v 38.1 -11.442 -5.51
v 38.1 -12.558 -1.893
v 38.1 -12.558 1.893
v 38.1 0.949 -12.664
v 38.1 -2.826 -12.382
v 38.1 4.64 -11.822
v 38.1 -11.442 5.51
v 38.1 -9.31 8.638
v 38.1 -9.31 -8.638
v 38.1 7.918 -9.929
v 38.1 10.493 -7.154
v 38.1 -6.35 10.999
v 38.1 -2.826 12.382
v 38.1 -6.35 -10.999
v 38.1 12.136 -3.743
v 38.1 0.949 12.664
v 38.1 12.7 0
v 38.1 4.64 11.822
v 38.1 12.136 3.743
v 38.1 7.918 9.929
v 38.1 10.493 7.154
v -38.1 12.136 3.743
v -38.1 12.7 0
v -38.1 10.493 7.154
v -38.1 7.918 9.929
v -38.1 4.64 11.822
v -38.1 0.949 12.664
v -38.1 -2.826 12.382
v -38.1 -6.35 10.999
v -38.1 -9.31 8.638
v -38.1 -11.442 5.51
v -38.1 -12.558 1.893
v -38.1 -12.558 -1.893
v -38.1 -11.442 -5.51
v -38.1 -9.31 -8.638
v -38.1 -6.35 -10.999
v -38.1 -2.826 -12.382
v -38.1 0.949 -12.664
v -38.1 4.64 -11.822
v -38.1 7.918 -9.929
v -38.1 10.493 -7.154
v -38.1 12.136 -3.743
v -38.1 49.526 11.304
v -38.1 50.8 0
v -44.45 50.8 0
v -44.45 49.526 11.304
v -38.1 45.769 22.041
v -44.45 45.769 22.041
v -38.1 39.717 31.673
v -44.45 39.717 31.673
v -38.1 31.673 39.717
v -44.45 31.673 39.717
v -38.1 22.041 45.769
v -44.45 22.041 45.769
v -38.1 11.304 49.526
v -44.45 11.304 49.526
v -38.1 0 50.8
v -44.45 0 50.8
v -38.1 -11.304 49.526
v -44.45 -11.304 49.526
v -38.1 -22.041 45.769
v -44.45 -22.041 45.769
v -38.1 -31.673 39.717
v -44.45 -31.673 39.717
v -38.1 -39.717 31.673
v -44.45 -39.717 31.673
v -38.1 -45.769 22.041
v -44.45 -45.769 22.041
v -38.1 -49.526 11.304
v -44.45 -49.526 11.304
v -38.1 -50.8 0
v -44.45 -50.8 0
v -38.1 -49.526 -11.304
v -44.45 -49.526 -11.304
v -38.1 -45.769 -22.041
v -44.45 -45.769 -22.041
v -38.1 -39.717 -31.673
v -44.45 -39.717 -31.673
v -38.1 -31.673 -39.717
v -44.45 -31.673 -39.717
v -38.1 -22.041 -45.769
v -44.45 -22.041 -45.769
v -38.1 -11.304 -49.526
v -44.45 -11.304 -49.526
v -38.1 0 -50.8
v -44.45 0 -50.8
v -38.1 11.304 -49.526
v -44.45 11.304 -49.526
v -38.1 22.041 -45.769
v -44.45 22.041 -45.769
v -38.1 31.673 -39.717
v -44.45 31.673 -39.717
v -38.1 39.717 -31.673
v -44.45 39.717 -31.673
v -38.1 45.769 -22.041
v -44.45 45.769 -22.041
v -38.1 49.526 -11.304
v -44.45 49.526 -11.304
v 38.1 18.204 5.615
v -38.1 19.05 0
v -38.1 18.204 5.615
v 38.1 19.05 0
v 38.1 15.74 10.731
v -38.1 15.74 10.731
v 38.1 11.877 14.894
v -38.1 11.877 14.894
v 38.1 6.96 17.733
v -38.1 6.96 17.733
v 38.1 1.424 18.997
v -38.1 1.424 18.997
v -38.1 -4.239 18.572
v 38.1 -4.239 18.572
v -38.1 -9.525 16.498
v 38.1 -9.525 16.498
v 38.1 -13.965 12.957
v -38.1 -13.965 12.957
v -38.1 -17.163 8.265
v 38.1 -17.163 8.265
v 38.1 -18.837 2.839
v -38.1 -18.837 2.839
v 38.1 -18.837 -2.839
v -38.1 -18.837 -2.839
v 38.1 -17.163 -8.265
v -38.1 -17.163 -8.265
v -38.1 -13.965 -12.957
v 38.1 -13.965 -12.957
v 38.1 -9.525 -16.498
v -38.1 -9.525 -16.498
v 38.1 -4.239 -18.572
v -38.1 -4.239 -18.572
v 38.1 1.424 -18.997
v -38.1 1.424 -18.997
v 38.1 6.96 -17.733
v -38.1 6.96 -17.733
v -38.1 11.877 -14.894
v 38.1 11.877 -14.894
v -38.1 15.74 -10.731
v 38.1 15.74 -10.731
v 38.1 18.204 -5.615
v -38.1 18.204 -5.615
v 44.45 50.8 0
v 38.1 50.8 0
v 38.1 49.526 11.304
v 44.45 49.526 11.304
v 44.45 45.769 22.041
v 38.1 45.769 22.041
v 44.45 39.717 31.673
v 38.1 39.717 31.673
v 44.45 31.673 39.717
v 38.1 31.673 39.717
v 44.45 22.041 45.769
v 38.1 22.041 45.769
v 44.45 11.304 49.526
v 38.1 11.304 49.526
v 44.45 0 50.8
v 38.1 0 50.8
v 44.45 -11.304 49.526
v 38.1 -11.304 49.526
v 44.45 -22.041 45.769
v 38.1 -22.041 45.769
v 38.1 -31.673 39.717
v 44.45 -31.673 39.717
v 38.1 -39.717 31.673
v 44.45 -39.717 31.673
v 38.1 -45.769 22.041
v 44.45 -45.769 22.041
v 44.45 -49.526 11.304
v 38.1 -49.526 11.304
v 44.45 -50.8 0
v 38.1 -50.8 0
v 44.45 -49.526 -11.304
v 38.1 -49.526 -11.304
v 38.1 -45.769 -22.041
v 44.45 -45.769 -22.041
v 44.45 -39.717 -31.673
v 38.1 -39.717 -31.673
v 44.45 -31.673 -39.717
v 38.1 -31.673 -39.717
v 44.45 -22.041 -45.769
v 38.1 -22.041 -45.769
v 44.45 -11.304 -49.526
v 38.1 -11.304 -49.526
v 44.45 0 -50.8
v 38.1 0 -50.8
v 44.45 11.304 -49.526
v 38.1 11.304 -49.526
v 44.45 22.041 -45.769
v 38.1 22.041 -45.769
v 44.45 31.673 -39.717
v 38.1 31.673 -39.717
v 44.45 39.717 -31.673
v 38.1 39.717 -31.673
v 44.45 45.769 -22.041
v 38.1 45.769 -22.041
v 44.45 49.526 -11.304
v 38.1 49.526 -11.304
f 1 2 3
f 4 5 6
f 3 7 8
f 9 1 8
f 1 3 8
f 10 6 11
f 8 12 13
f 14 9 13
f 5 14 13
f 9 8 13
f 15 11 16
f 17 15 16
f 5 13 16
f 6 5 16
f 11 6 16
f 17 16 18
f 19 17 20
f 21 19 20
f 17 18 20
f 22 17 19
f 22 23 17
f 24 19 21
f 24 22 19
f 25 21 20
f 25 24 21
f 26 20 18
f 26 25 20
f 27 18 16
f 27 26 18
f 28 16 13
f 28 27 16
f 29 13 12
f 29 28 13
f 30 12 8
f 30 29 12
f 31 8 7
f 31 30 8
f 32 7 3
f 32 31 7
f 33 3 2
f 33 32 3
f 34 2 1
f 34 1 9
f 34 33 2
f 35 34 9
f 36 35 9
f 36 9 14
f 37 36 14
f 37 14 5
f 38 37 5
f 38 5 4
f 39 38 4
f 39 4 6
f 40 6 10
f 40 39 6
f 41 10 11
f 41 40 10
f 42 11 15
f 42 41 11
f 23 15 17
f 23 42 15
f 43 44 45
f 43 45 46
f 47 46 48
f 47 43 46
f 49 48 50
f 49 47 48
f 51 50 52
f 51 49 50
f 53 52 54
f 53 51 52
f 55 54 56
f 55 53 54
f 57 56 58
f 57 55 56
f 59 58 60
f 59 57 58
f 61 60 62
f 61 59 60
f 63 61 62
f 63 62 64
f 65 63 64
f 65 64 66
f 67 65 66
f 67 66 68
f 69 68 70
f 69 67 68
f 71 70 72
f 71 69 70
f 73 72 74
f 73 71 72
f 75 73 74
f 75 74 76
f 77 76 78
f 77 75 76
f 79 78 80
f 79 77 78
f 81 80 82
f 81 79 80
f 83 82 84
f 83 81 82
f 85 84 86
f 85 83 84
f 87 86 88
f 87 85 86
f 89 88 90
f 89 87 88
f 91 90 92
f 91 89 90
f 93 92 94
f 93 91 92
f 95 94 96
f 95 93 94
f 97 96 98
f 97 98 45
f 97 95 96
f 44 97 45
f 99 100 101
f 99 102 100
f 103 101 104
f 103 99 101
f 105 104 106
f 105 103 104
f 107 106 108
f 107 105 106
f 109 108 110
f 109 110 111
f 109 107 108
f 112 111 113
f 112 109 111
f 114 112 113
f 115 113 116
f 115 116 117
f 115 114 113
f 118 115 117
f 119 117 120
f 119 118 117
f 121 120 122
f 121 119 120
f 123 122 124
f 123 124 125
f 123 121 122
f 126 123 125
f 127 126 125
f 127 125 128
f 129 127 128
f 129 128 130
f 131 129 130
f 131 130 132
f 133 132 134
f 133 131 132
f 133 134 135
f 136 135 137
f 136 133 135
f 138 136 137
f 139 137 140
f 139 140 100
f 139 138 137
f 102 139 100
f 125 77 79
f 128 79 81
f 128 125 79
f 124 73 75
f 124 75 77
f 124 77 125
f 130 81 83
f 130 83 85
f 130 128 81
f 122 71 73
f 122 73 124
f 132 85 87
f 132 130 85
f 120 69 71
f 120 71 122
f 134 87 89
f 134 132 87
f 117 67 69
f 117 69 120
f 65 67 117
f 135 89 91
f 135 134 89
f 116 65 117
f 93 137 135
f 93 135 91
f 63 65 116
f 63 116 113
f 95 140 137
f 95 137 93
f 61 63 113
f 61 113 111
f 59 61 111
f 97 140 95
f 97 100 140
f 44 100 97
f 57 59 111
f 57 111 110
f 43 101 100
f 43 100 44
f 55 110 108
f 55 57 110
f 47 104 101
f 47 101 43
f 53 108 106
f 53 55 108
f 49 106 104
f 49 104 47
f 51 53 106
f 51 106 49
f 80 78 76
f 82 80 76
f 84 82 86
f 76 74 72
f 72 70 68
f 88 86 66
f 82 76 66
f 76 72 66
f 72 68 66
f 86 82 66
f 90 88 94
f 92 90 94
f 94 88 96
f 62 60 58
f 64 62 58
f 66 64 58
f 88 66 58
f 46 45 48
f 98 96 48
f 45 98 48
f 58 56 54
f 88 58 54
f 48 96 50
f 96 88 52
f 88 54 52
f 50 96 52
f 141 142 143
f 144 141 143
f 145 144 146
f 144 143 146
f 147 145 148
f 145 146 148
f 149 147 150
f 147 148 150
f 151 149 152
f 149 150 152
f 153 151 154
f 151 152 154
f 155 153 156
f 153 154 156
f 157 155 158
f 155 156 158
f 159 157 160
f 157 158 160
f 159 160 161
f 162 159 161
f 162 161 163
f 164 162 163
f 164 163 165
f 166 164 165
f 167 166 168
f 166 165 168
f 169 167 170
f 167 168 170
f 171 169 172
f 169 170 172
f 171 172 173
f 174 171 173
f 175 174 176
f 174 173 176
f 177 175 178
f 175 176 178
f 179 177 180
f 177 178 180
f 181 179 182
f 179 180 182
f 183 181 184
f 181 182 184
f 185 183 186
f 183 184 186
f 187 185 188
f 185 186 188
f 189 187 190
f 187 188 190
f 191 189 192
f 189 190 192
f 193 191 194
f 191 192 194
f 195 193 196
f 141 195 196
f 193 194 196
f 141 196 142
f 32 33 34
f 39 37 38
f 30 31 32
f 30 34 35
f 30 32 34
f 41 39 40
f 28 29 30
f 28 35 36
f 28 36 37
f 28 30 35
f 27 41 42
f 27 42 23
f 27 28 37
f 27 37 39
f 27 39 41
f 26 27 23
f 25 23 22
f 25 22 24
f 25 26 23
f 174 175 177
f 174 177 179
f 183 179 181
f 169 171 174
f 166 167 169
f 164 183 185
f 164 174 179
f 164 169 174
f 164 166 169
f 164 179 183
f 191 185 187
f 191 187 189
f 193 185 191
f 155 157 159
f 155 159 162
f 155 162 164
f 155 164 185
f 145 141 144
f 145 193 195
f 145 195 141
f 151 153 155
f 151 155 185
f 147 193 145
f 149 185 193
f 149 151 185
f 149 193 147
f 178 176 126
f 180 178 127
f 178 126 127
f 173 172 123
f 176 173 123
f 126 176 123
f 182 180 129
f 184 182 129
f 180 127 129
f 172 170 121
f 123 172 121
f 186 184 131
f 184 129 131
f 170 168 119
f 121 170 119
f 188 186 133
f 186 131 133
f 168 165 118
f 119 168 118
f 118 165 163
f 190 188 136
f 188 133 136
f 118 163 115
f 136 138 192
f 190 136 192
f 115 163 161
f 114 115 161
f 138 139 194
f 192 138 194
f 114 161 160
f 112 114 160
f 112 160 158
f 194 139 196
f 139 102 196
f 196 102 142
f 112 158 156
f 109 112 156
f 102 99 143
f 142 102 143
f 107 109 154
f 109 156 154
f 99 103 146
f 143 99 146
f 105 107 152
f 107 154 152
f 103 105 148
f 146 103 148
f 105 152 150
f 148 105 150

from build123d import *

# Parameters (mm, degrees)
F2_R     = 50.8
F4_DEPTH = 6.35
F5_R     = 19.05
F5_R_2   = 12.7
F6_DEPTH = 38.1
F3_R     = 50.8
F7_DEPTH = 6.35


with BuildPart() as f4:
    # F2 (on offset) → F4 (new body)
    with BuildSketch(Plane.YZ.offset(-38.1)):
        Circle(F2_R)
    extrude(amount=-F4_DEPTH)

    # F5 (on Right) → F6 (join, symmetric)
    with BuildSketch(Plane.YZ):
        Circle(F5_R)
        Circle(F5_R_2, mode=Mode.SUBTRACT)
    extrude(amount=F6_DEPTH, both=True)

    # F3 (on offset) → F7 (join)
    with BuildSketch(Plane.YZ.offset(38.1)):
        Circle(F3_R)
    extrude(amount=F7_DEPTH)


solid = f4.part
